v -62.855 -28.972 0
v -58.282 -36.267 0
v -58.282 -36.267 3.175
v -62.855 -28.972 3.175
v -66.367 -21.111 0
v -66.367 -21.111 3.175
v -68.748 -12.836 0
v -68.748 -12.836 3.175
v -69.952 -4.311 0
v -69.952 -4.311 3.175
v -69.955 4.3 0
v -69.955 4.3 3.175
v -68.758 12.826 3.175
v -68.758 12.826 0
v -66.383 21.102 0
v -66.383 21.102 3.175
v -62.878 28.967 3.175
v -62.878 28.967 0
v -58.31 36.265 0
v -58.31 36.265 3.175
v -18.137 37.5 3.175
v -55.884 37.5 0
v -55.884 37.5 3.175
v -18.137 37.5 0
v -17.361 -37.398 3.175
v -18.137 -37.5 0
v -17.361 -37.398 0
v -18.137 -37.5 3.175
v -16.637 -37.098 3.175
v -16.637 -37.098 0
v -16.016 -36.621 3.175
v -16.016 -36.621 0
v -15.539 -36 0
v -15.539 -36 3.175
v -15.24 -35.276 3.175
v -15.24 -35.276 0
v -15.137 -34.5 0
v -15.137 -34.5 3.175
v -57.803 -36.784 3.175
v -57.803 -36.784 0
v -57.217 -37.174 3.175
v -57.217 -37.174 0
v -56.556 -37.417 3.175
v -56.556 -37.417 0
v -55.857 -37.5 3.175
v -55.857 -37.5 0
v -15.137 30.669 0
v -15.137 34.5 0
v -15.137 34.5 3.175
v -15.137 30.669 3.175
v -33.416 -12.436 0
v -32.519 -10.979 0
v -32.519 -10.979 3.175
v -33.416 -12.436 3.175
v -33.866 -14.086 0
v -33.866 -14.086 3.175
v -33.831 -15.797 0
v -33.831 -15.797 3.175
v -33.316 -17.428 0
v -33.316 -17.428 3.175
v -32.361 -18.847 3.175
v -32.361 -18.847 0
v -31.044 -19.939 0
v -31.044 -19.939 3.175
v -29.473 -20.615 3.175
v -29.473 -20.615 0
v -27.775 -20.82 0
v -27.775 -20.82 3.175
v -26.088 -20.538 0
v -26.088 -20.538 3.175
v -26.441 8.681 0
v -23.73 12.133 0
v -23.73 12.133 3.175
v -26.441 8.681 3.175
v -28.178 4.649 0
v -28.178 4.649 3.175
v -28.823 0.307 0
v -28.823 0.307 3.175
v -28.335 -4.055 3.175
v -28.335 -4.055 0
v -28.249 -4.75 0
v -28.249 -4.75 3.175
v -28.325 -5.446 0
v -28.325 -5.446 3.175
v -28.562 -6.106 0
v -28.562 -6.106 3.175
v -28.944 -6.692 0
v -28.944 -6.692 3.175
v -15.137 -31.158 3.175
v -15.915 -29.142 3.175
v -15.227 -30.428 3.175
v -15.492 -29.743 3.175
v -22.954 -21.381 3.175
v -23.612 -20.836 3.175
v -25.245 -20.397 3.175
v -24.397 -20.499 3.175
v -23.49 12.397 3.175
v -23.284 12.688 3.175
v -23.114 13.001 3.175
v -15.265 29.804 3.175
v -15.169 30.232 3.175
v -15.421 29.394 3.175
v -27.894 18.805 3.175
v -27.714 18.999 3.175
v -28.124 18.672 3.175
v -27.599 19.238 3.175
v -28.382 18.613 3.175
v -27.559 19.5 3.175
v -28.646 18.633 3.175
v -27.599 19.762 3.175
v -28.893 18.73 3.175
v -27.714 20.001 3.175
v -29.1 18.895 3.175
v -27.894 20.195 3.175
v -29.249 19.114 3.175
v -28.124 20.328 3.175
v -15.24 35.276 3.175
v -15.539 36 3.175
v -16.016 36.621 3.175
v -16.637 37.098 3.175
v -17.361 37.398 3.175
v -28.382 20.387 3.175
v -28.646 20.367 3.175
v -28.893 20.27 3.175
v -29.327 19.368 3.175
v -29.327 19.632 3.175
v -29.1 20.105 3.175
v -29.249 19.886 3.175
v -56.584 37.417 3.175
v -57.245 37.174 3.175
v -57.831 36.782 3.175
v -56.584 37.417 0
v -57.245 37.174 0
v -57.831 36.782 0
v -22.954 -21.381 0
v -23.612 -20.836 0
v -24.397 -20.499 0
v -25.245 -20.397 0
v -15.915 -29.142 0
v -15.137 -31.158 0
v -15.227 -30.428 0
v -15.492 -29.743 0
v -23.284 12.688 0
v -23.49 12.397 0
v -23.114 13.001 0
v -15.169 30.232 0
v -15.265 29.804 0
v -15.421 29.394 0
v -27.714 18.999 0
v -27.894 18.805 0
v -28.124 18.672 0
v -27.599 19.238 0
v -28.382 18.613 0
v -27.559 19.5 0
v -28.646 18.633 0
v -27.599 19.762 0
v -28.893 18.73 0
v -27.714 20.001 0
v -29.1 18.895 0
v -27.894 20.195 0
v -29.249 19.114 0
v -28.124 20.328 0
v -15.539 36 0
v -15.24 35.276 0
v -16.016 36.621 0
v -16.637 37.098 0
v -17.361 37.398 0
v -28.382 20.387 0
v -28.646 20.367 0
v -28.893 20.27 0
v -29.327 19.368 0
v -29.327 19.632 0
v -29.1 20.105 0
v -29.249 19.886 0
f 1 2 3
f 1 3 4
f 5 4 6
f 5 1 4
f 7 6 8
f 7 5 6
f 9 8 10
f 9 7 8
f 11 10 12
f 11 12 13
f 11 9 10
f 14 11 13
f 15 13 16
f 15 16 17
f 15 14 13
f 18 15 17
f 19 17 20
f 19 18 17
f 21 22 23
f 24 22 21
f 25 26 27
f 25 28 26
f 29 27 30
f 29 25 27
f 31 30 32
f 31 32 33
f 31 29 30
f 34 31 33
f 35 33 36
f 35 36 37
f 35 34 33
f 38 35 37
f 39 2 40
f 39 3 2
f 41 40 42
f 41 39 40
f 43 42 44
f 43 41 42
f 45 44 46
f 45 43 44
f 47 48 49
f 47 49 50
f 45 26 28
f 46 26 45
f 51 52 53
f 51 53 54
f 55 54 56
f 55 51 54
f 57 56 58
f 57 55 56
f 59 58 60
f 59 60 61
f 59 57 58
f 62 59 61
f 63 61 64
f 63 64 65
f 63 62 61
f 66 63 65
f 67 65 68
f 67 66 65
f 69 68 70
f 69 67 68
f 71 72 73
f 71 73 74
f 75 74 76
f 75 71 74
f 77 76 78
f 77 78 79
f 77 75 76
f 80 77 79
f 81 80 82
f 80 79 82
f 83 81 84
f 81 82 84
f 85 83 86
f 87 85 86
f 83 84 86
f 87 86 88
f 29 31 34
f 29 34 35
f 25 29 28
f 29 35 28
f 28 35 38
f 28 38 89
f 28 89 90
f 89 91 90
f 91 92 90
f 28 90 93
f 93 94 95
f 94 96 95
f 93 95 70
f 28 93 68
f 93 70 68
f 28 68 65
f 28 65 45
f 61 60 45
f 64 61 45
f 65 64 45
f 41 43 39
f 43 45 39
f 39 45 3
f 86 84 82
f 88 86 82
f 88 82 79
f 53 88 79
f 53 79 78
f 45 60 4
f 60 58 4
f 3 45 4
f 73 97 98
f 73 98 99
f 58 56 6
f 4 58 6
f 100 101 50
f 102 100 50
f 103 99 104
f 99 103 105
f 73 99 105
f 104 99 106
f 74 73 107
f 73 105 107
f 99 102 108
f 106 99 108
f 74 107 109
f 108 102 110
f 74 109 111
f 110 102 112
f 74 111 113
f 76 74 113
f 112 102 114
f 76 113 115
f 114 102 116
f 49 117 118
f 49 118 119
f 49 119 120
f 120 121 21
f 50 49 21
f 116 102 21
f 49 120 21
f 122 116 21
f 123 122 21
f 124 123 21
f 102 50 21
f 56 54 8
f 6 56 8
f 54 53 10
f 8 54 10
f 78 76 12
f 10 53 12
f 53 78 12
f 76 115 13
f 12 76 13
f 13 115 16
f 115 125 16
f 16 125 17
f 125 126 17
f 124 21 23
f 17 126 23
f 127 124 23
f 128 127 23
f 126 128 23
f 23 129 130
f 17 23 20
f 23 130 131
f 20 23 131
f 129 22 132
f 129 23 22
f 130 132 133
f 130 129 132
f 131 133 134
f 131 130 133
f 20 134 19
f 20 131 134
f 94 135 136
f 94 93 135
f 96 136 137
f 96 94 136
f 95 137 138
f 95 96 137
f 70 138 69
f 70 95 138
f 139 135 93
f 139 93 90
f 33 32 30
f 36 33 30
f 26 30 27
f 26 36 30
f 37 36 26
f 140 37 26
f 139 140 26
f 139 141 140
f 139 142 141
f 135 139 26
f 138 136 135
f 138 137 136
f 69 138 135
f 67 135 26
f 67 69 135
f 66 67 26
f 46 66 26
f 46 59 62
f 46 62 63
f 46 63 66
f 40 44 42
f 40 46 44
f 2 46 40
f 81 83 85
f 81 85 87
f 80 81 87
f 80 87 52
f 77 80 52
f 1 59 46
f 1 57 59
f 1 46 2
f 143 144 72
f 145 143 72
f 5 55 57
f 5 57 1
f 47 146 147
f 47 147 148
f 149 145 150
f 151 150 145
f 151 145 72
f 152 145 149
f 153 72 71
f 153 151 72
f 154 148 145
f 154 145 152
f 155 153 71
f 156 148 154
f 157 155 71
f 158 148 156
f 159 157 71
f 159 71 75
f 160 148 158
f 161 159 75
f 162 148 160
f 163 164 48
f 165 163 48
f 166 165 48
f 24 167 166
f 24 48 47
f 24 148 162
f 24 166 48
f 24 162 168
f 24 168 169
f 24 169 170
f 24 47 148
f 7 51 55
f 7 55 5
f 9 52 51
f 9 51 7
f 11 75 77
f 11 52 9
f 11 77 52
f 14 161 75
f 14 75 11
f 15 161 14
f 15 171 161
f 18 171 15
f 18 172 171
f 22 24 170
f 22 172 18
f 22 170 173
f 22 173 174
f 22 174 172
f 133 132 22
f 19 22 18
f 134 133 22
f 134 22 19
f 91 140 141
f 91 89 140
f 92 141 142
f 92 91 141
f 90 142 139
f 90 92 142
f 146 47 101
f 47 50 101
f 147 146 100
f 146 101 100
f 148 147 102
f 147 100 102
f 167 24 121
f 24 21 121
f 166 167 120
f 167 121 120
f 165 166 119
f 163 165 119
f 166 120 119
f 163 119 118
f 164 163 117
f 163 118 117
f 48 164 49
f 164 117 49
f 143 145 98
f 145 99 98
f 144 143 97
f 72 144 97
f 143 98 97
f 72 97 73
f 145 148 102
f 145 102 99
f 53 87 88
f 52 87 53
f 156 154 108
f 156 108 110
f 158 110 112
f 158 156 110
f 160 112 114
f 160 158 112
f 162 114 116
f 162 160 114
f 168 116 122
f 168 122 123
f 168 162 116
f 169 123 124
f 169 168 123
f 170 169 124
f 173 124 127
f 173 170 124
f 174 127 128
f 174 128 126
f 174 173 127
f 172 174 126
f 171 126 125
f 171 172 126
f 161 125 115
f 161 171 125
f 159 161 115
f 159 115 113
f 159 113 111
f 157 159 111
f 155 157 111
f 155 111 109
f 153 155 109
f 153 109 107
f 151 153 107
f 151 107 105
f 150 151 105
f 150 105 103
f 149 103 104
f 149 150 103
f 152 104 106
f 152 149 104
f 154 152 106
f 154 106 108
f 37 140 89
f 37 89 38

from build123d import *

# Parameters (mm, degrees)
SKETCH1_R           = 0.889
BOSS_EXTRUDE1_DEPTH = 3.175
FILLET1_R           = 3


with BuildPart() as part:
    # Sketch1 → Boss-Extrude1 (new body)
    with BuildSketch(Plane.XY):
        with BuildLine():
            Line((-57.387359122, 37.5), (-15.137359122, 37.5))
            Line((-15.137359122, 37.5), (-15.137359122, 30))
            Line((-15.137359122, 30), (-23.35327626, 12.490642695))
            ThreePointArc((-23.35327626, 12.490642695), (-28.301486723, 4.189647623), (-27.922607376, -5.466840166))
            Line((-27.922607376, -5.466840166), (-32.519153627, -10.979460849))
            ThreePointArc((-32.519153627, -10.979460849), (-32.321991252, -18.88915371), (-24.454232056, -19.726100177))
            Line((-24.454232056, -19.726100177), (-15.137359122, -30))
            Line((-15.137359122, -30), (-15.137359122, -37.5))
            Line((-15.137359122, -37.5), (-57.35903611, -37.5))
            ThreePointArc((-57.35903611, -37.5), (-70.10416265, -0.004807724), (-57.387359122, 37.5))
        make_face()
        with Locations((-28.448323012, 19.5)):
            Circle(SKETCH1_R, mode=Mode.SUBTRACT)
    extrude(amount=BOSS_EXTRUDE1_DEPTH)

    # Fillet1
    fillet1_edges = [part.edges().sort_by_distance(p)[0] for p in [
        (-24.454232056, -19.726100177, 1.5875),
        (-15.137359122, -30, 1.5875),
        (-15.137359122, -37.5, 1.5875),
        (-57.35903611, -37.5, 1.5875),
        (-57.387359122, 37.5, 1.5875),
        (-15.137359122, 37.5, 1.5875),
        (-15.137359122, 30, 1.5875),
        (-23.35327626, 12.490642695, 1.5875),
        (-27.922607376, -5.466840166, 1.5875),
    ]]
    fillet(fillet1_edges, radius=FILLET1_R)


solid = part.part
